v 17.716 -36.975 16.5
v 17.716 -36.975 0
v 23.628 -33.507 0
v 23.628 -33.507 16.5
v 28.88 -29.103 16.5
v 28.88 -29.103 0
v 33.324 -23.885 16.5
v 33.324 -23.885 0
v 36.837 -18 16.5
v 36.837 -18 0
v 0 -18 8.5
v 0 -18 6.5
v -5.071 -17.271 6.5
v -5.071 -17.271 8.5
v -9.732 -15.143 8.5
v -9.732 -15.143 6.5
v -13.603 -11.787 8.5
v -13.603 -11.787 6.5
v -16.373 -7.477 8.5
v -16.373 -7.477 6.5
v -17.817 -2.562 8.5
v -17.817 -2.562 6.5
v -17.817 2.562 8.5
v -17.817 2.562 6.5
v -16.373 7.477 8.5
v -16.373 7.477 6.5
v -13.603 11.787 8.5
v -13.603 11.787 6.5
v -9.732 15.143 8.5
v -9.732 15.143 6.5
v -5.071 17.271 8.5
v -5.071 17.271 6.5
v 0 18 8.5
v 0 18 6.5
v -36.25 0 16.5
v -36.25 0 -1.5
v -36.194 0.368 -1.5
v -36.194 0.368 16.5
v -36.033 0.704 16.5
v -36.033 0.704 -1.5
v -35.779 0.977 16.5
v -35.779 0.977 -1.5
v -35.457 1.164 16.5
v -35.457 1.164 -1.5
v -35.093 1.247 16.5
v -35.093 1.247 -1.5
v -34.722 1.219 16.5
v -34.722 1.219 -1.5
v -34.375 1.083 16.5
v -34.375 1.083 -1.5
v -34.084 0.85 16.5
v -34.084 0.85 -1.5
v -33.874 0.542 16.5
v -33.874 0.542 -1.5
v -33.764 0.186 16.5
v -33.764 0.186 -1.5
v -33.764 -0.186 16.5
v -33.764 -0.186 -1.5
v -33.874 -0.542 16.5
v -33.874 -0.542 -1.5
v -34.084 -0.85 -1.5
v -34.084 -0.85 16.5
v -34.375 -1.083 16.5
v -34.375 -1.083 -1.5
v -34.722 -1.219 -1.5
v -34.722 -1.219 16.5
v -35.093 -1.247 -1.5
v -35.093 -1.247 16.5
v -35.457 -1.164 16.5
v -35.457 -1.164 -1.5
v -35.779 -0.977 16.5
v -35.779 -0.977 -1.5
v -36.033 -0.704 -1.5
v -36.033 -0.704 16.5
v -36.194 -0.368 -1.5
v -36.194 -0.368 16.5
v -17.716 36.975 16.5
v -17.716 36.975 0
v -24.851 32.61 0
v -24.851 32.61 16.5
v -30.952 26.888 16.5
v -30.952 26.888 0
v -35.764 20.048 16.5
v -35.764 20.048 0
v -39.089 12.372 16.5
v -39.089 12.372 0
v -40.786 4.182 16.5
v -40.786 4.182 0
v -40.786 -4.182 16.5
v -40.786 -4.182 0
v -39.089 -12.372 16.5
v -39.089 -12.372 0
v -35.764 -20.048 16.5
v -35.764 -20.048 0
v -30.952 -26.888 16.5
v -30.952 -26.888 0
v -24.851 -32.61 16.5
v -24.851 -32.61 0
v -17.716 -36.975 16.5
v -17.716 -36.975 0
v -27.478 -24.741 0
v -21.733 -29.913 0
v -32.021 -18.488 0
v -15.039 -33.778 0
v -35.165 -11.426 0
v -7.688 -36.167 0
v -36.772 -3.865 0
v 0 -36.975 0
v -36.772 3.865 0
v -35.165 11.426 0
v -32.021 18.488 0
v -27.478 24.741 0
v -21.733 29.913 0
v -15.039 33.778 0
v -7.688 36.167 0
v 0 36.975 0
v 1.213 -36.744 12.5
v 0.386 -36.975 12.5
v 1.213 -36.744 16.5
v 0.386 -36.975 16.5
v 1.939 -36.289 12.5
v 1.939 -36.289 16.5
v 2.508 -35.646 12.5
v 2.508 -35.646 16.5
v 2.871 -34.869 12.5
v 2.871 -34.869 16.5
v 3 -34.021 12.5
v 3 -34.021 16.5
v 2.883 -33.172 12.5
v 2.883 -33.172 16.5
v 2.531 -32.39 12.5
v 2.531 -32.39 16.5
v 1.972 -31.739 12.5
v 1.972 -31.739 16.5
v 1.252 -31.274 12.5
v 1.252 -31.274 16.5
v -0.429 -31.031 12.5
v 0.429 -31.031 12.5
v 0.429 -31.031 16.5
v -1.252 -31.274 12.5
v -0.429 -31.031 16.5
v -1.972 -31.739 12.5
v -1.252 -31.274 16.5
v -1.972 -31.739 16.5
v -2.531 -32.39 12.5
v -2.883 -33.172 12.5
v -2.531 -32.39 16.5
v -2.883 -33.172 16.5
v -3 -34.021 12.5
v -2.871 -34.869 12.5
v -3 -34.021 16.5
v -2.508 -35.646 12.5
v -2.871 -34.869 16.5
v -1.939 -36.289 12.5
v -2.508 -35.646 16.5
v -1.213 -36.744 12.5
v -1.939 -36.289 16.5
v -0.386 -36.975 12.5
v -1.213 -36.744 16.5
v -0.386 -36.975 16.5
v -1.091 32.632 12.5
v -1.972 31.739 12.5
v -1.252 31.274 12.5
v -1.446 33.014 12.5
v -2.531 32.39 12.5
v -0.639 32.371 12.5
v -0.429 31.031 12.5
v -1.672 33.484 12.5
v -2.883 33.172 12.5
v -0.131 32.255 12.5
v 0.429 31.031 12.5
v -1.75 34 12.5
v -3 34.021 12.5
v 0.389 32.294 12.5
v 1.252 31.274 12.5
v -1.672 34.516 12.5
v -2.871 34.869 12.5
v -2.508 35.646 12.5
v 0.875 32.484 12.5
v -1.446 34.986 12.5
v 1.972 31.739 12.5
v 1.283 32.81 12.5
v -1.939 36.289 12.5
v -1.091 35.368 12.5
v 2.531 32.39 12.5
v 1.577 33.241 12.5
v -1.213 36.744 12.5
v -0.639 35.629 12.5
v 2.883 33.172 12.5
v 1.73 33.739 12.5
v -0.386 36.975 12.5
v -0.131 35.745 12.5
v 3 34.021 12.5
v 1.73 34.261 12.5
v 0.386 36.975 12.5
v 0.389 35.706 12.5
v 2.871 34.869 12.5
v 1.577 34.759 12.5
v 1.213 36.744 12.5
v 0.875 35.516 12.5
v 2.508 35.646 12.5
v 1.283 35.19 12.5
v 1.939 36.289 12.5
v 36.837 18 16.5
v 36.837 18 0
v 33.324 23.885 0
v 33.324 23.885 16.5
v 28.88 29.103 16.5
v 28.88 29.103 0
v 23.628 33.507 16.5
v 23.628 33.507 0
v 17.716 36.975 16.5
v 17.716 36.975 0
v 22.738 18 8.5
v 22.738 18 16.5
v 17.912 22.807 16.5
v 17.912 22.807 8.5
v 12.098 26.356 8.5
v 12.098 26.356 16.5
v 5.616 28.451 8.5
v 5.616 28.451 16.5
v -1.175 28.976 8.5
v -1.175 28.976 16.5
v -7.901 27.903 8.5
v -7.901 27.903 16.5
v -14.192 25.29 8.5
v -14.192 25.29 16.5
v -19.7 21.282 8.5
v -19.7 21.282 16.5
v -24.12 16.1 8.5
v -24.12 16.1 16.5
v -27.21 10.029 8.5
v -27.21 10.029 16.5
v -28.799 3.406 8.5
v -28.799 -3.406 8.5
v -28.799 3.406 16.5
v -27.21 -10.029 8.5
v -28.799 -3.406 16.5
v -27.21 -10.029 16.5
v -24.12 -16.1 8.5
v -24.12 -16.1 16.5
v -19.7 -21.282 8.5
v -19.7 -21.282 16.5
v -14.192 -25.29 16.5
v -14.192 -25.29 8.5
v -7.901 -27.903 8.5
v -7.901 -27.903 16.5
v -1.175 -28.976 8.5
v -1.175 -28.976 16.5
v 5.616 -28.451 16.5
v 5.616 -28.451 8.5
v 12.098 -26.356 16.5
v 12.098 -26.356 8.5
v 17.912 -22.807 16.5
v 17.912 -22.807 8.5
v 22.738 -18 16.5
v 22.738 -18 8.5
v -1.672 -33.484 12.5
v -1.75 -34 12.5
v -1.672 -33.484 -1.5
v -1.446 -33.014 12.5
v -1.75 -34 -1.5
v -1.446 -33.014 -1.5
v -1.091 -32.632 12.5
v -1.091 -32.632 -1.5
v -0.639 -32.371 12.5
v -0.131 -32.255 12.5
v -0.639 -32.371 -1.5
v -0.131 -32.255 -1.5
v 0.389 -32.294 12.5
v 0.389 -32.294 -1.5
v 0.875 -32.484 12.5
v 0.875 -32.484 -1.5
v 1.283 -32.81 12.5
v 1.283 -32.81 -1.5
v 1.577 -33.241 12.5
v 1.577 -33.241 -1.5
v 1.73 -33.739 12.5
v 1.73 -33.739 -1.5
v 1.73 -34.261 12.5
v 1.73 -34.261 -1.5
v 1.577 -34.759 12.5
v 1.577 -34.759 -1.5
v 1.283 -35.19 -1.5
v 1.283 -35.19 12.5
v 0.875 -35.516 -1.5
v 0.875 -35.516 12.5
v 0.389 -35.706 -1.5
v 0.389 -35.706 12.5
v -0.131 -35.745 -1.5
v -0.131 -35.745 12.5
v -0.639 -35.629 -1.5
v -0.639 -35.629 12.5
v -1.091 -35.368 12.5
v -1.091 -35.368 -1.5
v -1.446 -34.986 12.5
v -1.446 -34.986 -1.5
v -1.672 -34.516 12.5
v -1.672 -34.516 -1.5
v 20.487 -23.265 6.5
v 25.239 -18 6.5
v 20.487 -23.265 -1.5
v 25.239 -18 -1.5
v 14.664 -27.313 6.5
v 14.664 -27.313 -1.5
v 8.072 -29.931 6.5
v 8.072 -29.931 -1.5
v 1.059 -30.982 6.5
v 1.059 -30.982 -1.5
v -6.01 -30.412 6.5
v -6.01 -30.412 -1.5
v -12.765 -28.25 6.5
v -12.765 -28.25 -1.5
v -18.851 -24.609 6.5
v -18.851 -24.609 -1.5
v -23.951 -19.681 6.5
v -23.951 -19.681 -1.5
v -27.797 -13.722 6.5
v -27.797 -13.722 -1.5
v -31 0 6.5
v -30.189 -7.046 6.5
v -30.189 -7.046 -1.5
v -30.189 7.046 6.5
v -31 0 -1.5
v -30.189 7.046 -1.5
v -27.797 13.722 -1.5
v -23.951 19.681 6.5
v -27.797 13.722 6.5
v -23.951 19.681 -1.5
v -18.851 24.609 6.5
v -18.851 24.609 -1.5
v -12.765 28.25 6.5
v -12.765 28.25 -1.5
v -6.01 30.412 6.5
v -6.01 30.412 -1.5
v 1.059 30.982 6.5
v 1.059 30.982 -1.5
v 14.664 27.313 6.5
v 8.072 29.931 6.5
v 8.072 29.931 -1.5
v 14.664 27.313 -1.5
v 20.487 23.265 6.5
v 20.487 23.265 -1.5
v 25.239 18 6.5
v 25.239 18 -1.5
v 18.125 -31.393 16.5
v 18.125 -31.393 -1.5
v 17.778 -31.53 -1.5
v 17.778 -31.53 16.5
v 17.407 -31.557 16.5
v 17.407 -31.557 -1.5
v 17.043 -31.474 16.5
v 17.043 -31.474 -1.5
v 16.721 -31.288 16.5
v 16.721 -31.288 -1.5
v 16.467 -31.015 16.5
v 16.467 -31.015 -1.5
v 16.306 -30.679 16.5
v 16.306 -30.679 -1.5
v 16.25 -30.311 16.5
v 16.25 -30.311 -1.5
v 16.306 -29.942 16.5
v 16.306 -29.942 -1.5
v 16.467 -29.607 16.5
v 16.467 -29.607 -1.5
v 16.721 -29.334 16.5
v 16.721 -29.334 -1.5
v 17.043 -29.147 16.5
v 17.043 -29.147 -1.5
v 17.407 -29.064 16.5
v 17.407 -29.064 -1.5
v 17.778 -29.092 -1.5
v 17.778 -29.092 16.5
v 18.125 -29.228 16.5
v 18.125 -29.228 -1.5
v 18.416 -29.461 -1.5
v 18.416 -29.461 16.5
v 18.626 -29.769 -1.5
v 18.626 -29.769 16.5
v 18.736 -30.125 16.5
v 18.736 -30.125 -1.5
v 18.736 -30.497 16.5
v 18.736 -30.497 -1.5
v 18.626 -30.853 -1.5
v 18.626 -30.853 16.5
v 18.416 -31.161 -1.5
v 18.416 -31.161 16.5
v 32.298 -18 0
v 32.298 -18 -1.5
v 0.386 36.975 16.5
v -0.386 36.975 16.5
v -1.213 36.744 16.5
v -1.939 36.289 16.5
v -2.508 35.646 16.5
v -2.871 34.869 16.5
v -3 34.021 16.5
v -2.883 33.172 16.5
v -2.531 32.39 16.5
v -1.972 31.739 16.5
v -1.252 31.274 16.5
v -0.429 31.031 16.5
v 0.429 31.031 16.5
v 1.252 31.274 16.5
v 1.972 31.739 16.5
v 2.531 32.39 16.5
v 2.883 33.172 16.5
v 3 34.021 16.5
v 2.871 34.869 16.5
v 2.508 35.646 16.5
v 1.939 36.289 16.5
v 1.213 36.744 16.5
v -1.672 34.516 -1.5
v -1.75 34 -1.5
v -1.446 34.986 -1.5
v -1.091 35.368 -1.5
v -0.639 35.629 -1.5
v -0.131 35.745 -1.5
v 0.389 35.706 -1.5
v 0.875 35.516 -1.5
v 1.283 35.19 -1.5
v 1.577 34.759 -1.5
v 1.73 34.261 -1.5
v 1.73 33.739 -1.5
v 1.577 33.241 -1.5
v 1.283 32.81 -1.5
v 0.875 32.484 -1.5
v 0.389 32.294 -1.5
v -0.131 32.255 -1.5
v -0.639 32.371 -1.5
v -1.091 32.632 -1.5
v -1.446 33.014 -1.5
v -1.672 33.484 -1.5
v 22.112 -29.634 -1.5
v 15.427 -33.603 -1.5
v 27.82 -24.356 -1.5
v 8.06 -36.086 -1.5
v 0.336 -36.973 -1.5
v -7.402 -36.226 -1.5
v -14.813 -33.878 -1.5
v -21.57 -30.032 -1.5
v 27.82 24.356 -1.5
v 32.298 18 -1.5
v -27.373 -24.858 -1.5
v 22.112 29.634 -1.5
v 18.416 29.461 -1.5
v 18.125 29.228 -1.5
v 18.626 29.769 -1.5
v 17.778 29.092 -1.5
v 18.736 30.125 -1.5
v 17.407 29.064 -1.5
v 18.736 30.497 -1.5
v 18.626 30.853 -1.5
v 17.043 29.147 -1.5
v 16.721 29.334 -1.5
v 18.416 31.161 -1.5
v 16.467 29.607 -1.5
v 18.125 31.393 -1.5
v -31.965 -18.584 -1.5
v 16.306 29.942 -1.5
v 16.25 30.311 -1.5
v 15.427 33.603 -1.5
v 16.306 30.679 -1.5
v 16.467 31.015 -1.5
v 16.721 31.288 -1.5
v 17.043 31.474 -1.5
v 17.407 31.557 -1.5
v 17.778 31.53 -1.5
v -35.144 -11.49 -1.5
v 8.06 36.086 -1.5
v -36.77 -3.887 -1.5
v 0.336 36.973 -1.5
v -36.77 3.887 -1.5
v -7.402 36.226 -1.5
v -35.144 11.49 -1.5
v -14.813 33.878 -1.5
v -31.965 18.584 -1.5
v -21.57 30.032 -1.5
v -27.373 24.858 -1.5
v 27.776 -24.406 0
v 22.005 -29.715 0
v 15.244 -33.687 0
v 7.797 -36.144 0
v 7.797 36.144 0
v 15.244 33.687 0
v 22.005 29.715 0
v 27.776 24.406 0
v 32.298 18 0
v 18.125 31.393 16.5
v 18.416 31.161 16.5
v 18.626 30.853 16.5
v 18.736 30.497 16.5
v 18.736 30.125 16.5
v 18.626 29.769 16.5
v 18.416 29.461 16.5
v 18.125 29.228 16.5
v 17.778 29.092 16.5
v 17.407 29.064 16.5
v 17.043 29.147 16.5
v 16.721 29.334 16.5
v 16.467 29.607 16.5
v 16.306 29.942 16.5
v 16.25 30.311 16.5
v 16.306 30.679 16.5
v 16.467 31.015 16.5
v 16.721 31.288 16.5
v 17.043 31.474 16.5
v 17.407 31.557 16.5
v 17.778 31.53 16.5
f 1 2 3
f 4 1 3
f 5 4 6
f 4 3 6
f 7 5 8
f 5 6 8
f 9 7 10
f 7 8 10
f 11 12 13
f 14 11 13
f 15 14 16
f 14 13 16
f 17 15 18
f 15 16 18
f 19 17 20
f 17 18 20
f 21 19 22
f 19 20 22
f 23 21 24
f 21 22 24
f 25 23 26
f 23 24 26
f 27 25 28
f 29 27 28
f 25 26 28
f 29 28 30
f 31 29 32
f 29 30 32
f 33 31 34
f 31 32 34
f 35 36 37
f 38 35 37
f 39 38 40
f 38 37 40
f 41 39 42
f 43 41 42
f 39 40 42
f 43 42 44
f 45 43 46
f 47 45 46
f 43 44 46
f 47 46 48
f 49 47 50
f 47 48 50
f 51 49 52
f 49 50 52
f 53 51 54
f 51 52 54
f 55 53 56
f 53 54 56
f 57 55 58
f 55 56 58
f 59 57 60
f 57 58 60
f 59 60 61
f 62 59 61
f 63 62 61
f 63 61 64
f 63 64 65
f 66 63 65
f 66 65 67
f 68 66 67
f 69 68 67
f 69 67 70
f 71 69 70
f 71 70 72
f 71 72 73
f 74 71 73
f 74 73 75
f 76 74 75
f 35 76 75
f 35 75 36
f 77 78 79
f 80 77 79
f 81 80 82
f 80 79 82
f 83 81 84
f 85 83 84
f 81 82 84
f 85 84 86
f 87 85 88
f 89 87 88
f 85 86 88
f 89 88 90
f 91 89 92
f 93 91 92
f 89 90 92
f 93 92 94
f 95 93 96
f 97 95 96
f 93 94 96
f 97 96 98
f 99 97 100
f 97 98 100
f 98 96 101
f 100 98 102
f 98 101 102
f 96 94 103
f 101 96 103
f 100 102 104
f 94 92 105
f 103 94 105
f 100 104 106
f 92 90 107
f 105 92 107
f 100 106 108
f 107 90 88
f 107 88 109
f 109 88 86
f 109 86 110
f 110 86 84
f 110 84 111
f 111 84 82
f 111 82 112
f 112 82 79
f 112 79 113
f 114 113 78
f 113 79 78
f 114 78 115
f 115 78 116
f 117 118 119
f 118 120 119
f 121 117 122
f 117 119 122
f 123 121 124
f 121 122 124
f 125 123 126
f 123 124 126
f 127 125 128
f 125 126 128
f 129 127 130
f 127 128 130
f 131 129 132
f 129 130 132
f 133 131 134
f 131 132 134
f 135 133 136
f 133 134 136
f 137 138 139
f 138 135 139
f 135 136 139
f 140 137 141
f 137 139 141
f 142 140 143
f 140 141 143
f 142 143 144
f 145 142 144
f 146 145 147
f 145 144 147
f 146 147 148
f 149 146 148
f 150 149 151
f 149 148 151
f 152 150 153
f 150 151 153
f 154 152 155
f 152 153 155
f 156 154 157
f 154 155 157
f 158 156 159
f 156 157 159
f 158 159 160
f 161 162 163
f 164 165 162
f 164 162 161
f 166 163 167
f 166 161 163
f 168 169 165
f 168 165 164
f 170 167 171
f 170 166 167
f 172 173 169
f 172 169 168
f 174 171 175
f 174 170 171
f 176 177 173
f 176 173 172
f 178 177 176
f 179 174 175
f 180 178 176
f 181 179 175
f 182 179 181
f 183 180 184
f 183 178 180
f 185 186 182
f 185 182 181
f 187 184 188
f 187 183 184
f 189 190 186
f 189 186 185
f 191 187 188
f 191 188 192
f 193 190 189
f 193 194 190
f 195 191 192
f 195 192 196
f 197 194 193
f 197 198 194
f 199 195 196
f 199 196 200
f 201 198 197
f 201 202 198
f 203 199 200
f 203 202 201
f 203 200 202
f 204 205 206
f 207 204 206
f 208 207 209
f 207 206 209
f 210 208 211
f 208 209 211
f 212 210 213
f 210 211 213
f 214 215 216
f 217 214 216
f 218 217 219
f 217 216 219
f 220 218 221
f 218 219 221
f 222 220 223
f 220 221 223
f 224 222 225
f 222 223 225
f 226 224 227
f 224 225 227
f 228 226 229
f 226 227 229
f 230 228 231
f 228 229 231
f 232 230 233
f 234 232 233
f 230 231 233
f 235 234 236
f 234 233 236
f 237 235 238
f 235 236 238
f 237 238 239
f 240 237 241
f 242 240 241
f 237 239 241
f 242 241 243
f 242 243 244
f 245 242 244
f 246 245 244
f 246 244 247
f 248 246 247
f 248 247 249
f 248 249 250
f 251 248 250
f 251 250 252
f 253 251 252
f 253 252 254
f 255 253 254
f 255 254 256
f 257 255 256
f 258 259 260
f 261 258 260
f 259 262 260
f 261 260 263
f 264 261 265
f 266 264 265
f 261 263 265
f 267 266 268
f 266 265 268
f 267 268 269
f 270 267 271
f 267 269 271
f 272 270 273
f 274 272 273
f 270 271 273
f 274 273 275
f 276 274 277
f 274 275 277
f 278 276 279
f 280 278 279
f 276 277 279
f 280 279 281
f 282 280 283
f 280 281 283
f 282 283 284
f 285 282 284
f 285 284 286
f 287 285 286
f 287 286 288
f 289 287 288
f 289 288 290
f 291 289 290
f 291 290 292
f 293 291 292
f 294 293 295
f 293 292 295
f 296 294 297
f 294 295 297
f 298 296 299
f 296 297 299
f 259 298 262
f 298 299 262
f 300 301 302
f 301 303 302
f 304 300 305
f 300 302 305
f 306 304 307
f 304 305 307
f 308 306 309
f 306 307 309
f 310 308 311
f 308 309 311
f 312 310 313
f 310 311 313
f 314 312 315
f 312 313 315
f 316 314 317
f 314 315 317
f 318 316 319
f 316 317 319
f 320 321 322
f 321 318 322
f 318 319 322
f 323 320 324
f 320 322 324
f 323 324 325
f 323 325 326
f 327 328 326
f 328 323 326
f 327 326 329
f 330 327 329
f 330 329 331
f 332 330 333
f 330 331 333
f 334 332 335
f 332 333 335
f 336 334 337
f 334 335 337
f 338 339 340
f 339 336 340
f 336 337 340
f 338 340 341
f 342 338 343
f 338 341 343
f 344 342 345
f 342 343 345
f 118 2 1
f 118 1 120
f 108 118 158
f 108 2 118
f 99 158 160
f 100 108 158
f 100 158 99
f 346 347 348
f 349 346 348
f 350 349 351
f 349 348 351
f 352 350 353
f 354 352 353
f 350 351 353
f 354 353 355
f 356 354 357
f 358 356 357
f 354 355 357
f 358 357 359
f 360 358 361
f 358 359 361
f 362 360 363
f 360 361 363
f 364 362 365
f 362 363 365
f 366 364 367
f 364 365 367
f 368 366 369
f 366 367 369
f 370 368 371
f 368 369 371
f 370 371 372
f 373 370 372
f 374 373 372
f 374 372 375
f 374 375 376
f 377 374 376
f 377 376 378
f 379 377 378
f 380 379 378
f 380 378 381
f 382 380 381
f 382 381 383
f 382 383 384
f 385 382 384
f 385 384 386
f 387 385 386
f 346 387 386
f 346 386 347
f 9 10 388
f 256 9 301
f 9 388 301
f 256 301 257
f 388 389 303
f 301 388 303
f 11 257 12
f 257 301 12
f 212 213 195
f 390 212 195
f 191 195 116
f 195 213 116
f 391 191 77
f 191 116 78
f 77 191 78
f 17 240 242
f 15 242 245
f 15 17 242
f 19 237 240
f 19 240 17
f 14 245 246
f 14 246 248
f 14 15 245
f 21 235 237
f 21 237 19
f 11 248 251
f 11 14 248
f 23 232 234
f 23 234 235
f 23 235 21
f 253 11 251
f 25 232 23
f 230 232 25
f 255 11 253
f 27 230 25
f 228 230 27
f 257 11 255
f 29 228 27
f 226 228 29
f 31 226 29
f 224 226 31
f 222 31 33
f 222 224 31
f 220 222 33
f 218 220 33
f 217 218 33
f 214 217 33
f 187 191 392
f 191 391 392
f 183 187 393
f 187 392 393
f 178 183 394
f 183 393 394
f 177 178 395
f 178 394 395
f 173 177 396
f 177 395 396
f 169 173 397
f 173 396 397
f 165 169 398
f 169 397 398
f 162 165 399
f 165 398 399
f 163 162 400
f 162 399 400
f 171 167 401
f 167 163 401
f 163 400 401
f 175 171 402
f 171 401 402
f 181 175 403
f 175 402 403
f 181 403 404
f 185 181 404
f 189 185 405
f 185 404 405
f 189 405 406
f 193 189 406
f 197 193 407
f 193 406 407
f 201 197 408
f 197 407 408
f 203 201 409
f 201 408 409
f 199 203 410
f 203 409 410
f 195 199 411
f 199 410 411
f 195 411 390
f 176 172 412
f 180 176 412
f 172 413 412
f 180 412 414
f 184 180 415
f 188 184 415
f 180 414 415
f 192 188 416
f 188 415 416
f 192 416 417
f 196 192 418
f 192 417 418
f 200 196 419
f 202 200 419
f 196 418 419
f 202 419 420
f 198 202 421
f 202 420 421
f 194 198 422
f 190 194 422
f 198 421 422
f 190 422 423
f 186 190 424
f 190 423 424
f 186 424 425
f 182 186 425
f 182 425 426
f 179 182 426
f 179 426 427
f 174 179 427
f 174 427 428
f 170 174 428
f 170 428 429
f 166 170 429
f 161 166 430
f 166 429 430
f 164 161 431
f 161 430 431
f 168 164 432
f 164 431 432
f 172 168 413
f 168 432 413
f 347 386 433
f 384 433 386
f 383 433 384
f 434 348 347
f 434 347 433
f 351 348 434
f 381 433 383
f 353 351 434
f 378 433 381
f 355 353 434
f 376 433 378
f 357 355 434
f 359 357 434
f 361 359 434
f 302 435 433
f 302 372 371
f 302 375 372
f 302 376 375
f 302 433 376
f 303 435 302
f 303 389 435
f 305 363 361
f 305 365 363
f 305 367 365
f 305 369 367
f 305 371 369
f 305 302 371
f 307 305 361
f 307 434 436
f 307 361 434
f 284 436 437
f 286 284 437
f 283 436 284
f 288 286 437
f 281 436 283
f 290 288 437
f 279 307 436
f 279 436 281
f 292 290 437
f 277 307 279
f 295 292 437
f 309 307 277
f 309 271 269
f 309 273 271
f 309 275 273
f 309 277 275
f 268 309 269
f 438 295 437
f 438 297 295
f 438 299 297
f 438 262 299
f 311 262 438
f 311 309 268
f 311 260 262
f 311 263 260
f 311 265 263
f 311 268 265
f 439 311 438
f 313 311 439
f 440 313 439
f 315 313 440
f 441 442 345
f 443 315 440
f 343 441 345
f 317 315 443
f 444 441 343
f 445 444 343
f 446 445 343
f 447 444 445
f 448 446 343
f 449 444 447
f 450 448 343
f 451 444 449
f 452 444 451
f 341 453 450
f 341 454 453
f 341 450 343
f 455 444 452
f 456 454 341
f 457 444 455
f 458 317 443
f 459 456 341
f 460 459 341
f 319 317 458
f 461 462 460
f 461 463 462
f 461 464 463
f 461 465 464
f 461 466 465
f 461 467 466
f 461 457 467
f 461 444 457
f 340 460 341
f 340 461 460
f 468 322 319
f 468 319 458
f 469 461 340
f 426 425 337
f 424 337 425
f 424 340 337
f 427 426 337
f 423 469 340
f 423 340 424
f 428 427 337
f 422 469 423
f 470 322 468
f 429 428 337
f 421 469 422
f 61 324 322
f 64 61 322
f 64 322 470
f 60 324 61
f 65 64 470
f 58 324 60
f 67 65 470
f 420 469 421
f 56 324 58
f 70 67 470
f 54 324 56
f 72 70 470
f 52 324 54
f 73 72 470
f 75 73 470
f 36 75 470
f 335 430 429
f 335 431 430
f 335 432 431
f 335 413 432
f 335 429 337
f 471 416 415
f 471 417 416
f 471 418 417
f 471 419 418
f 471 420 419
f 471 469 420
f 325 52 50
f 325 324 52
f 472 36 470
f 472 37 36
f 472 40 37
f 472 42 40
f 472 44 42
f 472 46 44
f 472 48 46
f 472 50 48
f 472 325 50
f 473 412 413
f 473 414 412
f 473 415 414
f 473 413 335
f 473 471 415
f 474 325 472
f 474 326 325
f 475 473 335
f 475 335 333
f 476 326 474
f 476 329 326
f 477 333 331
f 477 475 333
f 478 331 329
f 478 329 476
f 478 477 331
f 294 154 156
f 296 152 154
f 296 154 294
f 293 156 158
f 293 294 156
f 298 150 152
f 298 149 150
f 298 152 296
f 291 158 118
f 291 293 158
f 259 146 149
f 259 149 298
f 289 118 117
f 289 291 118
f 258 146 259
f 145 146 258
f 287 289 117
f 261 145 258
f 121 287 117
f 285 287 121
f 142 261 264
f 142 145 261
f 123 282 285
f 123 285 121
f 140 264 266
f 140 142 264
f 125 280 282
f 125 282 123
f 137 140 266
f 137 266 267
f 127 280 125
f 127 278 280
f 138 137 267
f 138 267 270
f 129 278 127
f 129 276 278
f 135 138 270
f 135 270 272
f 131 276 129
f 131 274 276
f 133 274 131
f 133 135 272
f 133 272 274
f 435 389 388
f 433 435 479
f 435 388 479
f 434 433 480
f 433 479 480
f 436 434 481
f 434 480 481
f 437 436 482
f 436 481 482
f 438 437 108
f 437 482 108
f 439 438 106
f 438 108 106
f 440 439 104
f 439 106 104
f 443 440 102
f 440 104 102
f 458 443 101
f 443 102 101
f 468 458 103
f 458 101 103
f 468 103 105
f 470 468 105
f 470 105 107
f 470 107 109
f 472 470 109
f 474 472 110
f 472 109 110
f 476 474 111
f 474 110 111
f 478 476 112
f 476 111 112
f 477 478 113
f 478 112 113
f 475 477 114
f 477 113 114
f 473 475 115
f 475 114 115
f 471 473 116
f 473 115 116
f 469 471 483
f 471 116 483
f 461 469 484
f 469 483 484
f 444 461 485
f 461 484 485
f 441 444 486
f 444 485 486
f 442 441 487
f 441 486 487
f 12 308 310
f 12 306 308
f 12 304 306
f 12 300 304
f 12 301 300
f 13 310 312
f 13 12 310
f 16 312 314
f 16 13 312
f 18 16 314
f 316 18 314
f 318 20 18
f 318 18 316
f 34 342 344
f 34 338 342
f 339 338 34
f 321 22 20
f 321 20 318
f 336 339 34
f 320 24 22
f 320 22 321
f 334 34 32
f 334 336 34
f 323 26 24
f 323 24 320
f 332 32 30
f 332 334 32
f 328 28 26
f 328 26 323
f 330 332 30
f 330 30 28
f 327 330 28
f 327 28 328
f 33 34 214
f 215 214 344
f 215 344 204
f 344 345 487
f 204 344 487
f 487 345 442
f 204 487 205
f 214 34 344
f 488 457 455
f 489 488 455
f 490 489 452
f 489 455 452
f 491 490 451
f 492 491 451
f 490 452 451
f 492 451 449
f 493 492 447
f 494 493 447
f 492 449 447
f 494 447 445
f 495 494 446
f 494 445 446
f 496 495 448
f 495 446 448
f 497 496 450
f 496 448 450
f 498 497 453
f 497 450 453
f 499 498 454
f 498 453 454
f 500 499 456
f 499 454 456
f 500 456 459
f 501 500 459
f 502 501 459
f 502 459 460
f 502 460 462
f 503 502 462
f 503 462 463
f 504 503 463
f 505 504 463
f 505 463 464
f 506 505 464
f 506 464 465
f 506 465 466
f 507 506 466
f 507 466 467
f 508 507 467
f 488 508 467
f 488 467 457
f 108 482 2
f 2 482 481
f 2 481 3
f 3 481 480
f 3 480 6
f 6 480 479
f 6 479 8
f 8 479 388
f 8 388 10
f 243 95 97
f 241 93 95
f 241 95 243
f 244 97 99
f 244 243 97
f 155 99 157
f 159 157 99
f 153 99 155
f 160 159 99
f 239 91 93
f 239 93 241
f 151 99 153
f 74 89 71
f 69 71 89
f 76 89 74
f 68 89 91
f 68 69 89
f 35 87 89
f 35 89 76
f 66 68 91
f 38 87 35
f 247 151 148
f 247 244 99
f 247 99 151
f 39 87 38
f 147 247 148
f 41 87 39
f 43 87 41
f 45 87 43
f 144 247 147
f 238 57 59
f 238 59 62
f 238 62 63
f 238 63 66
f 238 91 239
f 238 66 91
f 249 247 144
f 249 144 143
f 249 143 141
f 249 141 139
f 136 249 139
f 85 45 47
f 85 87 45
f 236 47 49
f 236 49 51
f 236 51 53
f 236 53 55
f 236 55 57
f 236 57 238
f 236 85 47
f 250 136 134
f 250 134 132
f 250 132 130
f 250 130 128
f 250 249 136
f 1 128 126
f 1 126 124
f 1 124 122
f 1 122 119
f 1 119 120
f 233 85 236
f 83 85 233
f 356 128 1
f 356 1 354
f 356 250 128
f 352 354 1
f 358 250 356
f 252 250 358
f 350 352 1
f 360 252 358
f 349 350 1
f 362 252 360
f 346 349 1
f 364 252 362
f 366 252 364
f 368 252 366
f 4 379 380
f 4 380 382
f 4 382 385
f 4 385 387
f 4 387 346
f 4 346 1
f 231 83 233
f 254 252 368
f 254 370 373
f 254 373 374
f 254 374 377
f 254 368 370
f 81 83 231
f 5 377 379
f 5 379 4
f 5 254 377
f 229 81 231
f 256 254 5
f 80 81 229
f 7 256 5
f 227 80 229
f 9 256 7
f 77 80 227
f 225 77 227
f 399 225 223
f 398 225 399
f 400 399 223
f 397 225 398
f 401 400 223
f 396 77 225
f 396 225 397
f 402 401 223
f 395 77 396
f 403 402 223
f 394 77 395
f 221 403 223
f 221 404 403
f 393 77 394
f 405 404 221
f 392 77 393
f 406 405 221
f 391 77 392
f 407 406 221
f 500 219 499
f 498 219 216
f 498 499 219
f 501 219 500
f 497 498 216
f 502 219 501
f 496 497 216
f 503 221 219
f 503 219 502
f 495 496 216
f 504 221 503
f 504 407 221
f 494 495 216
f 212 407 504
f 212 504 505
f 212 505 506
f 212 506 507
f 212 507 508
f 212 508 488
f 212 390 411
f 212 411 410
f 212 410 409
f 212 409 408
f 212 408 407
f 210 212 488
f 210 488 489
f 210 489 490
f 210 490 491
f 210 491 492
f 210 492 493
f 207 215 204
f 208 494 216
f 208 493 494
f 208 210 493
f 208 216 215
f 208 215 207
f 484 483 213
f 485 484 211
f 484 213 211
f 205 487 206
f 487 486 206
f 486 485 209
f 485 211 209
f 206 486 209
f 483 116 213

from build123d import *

# Parameters (mm, degrees)
SKETCH_1_R                   = 41
EXTRUDE_1_DEPTH              = 16.5
SKETCH_2_R                   = 36.975
EXTRUDE_2_DEPTH              = 1.5
SKETCH_4_W                   = 50
SKETCH_4_H                   = 6.84002239
CUT_EXTRUDE_1_DEPTH          = 61.712436947
SKETCH_5_R                   = 31
CUT_EXTRUDE_3_DEPTH          = 8
SKETCH_6_R                   = 29
CUT_EXTRUDE_4_DEPTH          = 8
CUT_EXTRUDE_5_DEPTH          = 57.108382841
CUT_EXTRUDE_5_DEPTH_BACK     = 57.108382841
HOLE_WIZARD_M3_3_D           = 3.5
HOLE_WIZARD_M3_3_CBORE_D     = 6
HOLE_WIZARD_M3_3_CBORE_DEPTH = 4
HOLE_WIZARD_M3_1_D           = 2.5
PATTERN_CIRCULAR_1_COUNT     = 3


with BuildPart() as part:
    # 草图1 → 凸台-拉伸1 (new body)
    with BuildSketch(Plane.XY):
        Circle(SKETCH_1_R)
    extrude(amount=EXTRUDE_1_DEPTH)

    # 草图2 → 凸台-拉伸2 (add)
    with BuildSketch(Plane(origin=(0, 0, 0), x_dir=(-1, 0, 0), z_dir=(0, 0, -1))):
        Circle(SKETCH_2_R)
    extrude(amount=EXTRUDE_2_DEPTH)

    # 草图4 → 切除-拉伸1 (cut, through all)
    with BuildSketch(Plane(origin=(0, 0, -1.5), x_dir=(-1, 0, 0), z_dir=(0, 0, -1))):
        with Locations((0, 40.395011195)):
            Rectangle(SKETCH_4_W, SKETCH_4_H)
        with Locations((0, -40.395011195)):
            Rectangle(SKETCH_4_W, SKETCH_4_H)
    extrude(amount=-CUT_EXTRUDE_1_DEPTH, mode=Mode.SUBTRACT)

    # 草图5 → 切除-拉伸3 (cut)
    with BuildSketch(Plane(origin=(0, 0, -1.5), x_dir=(-1, 0, 0), z_dir=(0, 0, -1))):
        Circle(SKETCH_5_R)
    extrude(amount=-CUT_EXTRUDE_3_DEPTH, mode=Mode.SUBTRACT)

    # 草图6 → 切除-拉伸4 (cut)
    with BuildSketch(Plane.XY.offset(16.5)):
        Circle(SKETCH_6_R)
    extrude(amount=-CUT_EXTRUDE_4_DEPTH, mode=Mode.SUBTRACT)

    # 草图7 → 切除-拉伸5 (cut, two sides: drawn at the far end of the back side and taken through both)
    with BuildSketch(Plane.XY.offset(8.5).offset(-CUT_EXTRUDE_5_DEPTH_BACK)):
        with BuildLine():
            Line((0, 18), (36.837480913, 18))
            ThreePointArc((36.837480913, 18), (41, 0), (36.837480913, -18))
            Line((36.837480913, -18), (0, -18))
            ThreePointArc((0, -18), (-18, 0), (0, 18))
        make_face()
    extrude(amount=CUT_EXTRUDE_5_DEPTH + CUT_EXTRUDE_5_DEPTH_BACK, mode=Mode.SUBTRACT)

    # M3 六角头螺栓的柱形沉头孔3 (through all)
    with Locations(Plane(origin=(0, 34, 16.5), x_dir=(1, 0, 0), z_dir=(0, 0, 1))):
        with Locations((0, 0), (0, -68)):
            CounterBoreHole(HOLE_WIZARD_M3_3_D / 2, HOLE_WIZARD_M3_3_CBORE_D / 2, HOLE_WIZARD_M3_3_CBORE_DEPTH)

    # M3 螺纹孔1 (through all)
    with Locations(Plane(origin=(-35, 0, 16.5), x_dir=(1, 0, 0), z_dir=(0, 0, 1))):
        with Locations((0, 0)):
            hole_wizard_m3_1 = Hole(HOLE_WIZARD_M3_1_D / 2)

    # 阵列(圆周)1: M3 螺纹孔1 ×3 about axis
    pattern_circular_1_axis = Axis((0, 0, 0), (0, 0, 1))
    for i in range(1, PATTERN_CIRCULAR_1_COUNT):
        add(hole_wizard_m3_1.rotate(pattern_circular_1_axis, i * 360 / PATTERN_CIRCULAR_1_COUNT), mode=Mode.SUBTRACT)


solid = part.part
